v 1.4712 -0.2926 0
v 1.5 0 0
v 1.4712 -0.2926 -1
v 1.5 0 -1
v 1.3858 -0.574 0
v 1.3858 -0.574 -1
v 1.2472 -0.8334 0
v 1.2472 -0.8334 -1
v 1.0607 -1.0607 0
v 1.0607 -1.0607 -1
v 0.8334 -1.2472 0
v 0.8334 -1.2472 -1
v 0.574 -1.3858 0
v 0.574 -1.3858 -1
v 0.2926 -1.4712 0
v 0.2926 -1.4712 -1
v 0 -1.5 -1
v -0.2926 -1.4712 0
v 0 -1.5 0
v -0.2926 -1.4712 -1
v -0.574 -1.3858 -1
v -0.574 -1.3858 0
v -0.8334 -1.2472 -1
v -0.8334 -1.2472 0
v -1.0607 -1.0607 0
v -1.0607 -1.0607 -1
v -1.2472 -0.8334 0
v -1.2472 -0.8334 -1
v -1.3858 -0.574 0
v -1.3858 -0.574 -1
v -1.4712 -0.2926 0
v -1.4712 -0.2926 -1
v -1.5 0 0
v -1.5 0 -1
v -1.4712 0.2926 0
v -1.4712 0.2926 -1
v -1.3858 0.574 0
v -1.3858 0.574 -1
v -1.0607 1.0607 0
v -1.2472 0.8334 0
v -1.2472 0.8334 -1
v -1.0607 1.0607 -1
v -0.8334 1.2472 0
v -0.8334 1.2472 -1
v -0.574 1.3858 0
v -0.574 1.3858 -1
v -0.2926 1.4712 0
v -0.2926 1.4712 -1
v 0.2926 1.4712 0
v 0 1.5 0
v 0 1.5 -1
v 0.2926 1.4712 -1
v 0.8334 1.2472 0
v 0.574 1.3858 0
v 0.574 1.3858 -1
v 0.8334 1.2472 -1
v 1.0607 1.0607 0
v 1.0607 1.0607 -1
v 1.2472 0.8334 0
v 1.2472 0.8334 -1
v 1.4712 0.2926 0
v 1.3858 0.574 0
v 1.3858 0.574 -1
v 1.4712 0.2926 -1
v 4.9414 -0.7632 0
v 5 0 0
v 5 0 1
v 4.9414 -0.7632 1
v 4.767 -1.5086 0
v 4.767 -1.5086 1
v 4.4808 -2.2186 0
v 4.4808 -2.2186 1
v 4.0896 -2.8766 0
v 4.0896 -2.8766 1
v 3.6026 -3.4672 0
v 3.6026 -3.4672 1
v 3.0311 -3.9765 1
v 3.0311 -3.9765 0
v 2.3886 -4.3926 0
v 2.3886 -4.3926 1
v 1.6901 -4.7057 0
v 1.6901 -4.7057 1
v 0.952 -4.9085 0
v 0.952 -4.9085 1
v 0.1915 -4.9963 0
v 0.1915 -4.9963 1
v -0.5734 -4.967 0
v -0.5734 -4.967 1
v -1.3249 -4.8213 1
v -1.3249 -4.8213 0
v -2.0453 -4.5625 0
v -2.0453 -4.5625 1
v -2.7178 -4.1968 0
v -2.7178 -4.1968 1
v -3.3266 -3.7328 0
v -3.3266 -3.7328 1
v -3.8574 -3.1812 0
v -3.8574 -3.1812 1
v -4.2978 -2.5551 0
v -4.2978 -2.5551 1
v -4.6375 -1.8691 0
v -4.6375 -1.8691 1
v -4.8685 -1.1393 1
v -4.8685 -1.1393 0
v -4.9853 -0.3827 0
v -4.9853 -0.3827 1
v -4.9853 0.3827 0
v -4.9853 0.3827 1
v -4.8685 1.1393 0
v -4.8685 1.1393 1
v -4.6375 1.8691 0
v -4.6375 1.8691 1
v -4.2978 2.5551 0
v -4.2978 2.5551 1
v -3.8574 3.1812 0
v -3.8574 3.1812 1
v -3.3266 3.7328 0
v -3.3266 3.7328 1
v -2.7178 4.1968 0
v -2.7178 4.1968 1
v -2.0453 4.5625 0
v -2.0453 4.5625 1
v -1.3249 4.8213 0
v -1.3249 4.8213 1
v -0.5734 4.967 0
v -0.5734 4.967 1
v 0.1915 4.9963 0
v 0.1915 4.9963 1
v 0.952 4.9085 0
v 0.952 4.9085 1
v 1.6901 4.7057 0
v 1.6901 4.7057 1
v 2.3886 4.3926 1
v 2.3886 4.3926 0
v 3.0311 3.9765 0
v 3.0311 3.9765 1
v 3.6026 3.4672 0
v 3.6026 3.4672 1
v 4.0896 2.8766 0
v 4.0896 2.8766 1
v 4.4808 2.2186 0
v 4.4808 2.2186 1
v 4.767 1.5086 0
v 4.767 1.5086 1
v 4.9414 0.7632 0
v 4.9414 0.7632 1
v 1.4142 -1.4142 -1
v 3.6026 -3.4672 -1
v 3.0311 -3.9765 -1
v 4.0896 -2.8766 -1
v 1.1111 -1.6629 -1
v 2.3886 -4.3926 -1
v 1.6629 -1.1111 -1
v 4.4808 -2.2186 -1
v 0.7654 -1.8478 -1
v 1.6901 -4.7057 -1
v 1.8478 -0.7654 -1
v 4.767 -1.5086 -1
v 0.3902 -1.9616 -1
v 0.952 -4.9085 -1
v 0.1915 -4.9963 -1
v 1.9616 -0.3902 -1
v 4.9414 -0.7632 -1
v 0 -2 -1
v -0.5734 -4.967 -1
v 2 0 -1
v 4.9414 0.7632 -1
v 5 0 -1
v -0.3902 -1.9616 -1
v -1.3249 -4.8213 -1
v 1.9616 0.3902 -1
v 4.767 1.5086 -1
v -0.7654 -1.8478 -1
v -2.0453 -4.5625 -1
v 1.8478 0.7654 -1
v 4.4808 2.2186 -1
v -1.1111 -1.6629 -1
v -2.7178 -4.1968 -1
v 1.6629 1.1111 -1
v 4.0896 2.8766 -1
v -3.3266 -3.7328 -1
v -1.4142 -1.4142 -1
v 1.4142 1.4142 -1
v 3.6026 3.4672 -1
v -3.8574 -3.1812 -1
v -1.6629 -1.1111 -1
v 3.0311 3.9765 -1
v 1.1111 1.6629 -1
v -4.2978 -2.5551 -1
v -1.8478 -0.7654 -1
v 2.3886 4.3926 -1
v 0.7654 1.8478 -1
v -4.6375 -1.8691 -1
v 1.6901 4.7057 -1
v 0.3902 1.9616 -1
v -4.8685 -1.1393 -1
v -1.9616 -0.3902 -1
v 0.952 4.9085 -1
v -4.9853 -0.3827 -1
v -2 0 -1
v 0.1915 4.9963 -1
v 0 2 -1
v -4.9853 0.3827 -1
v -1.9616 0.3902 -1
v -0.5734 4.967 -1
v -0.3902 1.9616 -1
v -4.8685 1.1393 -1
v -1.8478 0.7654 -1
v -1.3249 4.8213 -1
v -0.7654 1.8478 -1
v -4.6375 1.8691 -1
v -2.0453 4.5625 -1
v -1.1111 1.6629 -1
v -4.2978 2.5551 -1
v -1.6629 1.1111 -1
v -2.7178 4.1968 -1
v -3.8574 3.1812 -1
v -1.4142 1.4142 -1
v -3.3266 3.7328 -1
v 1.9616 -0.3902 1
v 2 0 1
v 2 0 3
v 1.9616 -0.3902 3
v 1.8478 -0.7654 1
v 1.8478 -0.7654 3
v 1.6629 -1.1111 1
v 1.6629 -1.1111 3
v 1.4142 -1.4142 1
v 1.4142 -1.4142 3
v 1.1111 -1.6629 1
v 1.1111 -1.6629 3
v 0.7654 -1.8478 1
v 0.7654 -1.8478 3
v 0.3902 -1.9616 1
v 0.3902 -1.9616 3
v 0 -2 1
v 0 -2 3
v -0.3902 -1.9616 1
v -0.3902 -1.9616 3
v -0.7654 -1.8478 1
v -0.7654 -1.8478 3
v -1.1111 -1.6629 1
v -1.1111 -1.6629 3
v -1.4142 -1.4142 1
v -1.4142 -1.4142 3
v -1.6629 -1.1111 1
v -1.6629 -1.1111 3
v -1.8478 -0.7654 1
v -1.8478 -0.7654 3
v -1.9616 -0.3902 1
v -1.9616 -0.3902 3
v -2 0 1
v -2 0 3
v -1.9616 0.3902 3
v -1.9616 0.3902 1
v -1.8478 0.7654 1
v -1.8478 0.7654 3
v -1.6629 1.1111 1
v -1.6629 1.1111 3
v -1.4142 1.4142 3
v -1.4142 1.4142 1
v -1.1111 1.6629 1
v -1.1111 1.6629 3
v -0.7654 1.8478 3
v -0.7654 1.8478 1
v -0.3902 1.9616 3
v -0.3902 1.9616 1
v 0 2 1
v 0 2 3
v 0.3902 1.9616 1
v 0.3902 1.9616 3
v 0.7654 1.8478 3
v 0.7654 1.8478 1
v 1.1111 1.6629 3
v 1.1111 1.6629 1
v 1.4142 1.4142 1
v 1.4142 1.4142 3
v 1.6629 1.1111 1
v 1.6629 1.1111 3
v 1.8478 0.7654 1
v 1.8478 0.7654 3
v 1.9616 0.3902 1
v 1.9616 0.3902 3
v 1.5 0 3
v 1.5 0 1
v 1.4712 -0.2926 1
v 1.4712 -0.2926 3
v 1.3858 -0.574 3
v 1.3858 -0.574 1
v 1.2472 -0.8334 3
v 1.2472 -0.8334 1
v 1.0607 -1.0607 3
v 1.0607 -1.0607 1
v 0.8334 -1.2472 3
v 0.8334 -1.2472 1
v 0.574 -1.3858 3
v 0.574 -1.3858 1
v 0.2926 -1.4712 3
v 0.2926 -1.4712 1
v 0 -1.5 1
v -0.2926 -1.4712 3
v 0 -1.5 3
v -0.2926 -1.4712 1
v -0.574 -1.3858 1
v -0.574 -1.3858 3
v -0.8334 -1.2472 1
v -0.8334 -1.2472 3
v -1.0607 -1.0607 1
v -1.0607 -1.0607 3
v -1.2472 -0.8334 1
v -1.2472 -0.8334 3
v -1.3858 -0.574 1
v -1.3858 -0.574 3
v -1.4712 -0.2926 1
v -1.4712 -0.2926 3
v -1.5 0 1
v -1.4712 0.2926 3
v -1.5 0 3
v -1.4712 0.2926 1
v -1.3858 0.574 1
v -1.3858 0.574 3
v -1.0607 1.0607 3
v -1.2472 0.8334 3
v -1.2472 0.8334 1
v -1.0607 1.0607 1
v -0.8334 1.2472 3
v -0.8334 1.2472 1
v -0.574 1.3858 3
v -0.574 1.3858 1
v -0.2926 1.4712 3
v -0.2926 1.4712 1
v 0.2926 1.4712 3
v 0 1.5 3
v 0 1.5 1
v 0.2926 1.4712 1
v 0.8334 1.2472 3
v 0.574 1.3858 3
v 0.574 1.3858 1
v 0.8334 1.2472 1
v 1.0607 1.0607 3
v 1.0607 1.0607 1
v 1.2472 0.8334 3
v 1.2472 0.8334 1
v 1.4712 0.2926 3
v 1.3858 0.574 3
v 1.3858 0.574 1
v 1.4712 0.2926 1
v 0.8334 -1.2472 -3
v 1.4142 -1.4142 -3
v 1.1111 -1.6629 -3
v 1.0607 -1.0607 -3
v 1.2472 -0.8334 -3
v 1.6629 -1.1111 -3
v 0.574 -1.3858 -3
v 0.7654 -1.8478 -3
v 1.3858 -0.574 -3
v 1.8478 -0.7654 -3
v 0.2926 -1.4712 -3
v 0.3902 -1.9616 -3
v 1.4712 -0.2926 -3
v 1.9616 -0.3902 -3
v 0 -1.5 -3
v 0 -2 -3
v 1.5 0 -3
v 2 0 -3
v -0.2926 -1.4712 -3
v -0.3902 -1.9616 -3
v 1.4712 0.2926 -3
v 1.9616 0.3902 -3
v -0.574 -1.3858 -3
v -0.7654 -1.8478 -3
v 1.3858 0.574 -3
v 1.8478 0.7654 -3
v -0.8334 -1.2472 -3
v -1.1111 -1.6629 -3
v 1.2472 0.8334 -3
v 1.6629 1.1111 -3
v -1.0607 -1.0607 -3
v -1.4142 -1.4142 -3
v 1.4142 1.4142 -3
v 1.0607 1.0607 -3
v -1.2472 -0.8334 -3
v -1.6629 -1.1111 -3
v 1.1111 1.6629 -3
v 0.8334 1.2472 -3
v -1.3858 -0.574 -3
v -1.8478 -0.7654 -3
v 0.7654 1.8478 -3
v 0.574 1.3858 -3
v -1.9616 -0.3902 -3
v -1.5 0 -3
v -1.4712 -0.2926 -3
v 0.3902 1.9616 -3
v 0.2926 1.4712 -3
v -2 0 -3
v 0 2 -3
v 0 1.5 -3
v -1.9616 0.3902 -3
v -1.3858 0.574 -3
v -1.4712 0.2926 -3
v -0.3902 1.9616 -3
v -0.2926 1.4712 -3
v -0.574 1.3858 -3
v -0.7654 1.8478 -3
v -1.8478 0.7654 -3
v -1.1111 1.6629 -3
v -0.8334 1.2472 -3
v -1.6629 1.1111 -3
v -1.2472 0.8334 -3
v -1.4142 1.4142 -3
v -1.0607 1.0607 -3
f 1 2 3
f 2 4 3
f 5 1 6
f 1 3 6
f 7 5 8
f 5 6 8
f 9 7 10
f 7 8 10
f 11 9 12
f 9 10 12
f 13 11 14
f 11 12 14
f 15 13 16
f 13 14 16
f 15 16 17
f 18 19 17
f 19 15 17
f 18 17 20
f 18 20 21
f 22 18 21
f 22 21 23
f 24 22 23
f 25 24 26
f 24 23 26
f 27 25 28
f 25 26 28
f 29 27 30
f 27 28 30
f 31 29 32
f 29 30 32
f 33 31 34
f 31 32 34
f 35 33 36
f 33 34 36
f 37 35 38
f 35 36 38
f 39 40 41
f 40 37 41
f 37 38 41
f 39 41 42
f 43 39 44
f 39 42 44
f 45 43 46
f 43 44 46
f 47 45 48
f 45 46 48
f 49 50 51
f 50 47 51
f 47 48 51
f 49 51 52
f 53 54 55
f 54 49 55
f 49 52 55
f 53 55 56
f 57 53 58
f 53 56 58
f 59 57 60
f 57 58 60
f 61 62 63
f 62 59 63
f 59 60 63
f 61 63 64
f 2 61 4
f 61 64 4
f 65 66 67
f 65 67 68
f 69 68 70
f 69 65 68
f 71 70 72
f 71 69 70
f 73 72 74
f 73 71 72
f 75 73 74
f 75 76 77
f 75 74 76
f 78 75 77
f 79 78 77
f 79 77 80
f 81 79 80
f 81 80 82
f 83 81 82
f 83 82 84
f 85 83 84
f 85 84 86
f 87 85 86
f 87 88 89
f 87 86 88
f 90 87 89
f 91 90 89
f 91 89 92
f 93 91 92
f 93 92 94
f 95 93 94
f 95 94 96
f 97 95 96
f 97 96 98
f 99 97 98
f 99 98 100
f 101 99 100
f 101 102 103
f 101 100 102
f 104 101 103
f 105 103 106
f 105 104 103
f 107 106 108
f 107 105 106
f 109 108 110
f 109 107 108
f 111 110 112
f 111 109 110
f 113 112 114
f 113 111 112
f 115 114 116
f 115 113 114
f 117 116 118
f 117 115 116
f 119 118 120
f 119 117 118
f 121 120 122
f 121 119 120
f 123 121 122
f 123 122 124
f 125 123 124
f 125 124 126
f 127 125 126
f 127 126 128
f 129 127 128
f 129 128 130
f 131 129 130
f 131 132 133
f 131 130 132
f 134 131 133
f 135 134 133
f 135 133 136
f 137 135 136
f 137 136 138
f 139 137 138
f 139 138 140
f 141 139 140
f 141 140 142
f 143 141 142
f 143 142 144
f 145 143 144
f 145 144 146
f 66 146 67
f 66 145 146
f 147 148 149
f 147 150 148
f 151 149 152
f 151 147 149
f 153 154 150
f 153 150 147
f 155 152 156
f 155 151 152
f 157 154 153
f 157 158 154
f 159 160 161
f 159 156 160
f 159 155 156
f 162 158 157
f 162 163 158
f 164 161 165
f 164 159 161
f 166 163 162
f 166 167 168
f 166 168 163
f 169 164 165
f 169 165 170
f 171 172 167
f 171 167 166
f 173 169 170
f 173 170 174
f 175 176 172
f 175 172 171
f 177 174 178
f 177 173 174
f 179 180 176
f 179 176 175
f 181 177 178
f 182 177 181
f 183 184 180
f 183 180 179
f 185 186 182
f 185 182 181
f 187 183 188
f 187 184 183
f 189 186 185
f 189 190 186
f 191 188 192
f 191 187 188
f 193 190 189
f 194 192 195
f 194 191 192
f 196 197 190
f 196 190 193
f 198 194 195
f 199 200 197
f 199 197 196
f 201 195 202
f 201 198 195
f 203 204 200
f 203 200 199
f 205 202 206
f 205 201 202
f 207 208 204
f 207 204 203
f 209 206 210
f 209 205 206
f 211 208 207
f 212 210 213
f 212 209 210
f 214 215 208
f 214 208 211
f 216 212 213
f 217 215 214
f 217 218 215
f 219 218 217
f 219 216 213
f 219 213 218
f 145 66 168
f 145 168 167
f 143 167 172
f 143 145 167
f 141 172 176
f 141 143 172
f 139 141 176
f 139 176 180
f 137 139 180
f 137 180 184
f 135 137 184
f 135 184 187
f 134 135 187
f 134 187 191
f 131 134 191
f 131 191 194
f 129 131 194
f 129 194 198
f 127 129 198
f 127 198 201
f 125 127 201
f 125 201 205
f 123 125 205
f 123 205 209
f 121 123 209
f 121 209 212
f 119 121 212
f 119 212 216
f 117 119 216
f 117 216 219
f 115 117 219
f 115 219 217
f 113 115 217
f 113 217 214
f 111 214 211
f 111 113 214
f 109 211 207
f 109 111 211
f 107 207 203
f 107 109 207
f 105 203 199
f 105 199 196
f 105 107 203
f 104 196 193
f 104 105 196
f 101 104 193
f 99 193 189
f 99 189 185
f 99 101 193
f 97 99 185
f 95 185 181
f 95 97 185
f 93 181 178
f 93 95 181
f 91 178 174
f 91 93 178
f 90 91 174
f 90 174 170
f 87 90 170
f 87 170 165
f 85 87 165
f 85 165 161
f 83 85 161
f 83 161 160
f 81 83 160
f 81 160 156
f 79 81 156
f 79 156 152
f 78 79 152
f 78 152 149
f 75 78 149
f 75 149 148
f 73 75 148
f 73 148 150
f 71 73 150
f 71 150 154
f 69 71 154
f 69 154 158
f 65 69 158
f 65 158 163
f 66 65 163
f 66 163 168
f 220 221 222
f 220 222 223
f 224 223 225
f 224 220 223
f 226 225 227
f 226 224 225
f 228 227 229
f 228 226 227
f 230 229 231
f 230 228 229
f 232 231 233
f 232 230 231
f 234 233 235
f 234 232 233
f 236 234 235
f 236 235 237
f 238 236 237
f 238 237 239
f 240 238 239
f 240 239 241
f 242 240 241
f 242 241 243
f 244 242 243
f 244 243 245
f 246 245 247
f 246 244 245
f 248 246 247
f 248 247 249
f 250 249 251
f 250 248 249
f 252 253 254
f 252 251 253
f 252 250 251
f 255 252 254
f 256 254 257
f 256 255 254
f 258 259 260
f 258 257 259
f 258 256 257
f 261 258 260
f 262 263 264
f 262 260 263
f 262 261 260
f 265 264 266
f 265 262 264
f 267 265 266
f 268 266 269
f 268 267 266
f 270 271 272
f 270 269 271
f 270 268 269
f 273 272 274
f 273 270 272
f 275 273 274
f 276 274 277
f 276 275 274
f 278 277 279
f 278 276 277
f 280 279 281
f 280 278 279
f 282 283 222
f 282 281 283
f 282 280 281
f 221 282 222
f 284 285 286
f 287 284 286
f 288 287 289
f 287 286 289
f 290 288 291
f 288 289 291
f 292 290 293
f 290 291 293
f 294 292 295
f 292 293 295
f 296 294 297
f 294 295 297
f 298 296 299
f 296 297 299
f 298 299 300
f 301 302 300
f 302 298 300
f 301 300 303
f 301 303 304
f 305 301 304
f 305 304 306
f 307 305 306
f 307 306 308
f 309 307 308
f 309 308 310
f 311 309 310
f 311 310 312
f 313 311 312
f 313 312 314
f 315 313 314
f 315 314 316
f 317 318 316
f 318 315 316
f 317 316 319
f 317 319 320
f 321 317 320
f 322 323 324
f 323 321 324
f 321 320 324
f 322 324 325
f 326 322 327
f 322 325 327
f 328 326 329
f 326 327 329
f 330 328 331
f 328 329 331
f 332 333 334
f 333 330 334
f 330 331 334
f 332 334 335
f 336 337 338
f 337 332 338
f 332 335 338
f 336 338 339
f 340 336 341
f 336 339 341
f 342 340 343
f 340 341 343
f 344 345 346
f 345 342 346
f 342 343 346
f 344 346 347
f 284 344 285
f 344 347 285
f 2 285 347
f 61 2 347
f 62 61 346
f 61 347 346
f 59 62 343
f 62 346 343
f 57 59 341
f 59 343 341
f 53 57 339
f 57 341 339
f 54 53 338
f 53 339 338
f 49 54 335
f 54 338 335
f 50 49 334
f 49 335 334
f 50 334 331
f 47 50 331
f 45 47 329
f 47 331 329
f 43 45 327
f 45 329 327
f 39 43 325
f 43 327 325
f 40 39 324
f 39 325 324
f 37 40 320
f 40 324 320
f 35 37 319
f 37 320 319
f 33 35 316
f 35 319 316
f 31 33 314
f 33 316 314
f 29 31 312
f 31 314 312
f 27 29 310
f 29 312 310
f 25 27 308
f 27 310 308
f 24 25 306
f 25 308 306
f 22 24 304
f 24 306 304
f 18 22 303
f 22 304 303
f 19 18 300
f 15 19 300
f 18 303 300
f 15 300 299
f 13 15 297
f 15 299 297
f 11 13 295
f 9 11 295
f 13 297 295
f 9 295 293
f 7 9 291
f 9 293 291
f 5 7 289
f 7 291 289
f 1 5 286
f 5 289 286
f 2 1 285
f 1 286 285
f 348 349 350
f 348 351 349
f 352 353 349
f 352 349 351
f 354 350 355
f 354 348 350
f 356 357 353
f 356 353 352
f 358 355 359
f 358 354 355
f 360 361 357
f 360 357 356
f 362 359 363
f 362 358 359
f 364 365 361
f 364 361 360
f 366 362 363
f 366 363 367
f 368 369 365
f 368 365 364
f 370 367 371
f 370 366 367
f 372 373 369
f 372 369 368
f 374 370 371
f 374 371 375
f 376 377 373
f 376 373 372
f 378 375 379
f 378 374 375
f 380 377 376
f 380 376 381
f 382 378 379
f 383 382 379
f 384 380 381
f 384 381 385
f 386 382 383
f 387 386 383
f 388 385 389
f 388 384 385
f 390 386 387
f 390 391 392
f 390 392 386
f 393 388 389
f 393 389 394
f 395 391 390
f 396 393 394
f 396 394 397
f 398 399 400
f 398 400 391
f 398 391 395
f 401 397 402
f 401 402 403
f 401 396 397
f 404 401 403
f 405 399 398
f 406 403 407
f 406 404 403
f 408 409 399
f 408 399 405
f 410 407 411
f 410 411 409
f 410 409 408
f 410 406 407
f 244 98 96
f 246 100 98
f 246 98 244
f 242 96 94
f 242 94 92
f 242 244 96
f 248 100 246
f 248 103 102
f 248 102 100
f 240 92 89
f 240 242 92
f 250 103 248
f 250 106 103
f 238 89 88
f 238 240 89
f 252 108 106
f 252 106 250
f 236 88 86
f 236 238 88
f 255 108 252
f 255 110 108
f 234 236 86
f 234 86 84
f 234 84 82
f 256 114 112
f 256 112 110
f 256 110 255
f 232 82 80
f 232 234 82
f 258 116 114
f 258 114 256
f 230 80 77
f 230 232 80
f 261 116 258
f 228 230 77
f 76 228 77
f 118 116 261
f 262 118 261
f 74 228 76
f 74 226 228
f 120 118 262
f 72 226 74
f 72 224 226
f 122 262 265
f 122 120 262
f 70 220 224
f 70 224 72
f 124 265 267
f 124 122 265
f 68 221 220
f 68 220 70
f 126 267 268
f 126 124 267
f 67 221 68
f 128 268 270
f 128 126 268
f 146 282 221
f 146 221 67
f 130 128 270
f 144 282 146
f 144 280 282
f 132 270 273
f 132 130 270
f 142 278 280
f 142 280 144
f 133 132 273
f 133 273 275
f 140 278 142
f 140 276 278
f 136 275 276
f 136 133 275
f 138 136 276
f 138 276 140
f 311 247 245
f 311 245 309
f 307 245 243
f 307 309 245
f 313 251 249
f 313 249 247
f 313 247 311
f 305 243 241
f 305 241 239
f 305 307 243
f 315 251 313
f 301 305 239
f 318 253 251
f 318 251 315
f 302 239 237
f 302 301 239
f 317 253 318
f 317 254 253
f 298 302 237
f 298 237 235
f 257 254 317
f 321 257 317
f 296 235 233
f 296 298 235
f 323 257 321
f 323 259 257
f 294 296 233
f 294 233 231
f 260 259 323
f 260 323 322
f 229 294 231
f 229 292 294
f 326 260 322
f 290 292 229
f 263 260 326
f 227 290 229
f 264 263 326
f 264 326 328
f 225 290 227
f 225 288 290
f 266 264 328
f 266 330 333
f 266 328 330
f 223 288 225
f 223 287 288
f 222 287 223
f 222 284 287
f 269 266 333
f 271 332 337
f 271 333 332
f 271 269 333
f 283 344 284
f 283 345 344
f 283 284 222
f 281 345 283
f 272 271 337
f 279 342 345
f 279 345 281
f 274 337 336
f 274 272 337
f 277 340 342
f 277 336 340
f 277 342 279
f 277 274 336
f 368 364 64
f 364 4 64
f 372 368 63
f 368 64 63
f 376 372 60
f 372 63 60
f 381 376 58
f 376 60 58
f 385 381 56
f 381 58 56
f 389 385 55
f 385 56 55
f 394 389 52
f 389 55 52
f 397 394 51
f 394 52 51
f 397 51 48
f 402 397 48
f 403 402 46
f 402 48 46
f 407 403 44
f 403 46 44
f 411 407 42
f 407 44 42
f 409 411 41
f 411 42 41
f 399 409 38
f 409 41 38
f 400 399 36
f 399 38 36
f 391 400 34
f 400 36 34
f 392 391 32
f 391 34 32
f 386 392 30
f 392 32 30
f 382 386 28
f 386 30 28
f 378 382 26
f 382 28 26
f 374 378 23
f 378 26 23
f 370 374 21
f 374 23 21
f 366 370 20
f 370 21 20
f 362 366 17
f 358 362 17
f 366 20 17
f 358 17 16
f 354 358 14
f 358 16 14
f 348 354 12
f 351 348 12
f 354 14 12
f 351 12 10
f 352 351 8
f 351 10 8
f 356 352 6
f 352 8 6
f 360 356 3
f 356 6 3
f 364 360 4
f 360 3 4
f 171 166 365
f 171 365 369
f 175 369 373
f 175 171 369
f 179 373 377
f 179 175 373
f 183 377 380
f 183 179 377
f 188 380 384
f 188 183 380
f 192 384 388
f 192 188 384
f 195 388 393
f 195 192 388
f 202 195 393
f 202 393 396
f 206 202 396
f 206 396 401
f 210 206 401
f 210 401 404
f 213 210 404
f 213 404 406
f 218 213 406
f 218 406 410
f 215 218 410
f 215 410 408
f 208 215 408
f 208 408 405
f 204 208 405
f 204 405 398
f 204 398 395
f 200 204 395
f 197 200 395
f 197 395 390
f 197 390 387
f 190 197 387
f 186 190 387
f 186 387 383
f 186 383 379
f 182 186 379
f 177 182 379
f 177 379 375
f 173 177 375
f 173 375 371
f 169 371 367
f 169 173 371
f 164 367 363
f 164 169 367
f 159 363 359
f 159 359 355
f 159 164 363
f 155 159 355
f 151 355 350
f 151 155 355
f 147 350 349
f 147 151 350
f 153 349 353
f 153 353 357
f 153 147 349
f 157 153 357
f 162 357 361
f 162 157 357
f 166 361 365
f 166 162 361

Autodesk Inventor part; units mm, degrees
ref_plane "YZ Plane" through (0, 0, 0) normal (1, 0, 0) x (0, 1, 0)
ref_plane "XZ Plane" through (0, 0, 0) normal (0, 1, 0) x (-1, 0, 0)
ref_plane "XY Plane" through (0, 0, 0) normal (0, 0, 1) x (1, 0, 0)
sketch "Sketch1" plane through (0, 0, 0) normal (0, 0, 1) x (1, 0, 0)
  circle A0 centre (0, 0) radius 5
  dimension "d0" = 10
extrude "Extrusion1" add sketch "Sketch1" along normal blind 1
sketch "Sketch2" plane through (0, 0, 1) normal (0, 0, 1) x (1, 0, 0)
  circle A0 centre (0, 0) radius 1.5
  circle A1 centre (0, 0) radius 2
  dimension "d3" = 3
  dimension "d4" = 4
extrude "Extrusion2" cut sketch "Sketch2" against normal blind 1.5 contours A0
extrude "Extrusion3" add sketch "Sketch2" along normal blind 2
mirror "Mirror2" about plane through (0, 0, 0) normal (0, 0, -1)
properties part number "einzel_element"
